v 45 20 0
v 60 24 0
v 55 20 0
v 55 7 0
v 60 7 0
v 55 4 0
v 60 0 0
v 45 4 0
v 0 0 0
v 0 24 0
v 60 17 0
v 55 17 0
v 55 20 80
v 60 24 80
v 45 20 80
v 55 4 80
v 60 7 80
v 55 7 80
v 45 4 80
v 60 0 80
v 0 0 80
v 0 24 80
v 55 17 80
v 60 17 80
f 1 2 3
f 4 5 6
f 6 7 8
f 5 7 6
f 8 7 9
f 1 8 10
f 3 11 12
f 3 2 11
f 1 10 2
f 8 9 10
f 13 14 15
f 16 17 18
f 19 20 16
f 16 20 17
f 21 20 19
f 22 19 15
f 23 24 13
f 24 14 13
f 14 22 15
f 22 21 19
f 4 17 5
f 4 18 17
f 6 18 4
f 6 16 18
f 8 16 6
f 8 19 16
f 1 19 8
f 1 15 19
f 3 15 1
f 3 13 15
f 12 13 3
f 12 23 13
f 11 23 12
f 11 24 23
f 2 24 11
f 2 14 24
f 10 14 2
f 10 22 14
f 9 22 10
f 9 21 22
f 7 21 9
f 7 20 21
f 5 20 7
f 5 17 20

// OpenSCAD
$fn = 32;

// ----------------------------------------------------------------------
// T-slot rail: 60 x 24 mm section, 80 mm long
// ----------------------------------------------------------------------

// --- parameters (mm) ---
profile_height = 80;      // extrusion height
profile_points = 12;      // points of the closed outline

profile = [[0, 0], [60, 0], [60, 7], [55, 7], [55, 4], [45, 4], [45, 20], [55, 20], [55, 17], [60, 17], [60, 24], [0, 24]];  // single closed polygon, 12 points, counter clockwise

// --- the one profile operation ---
linear_extrude(height = profile_height) polygon(points = profile);
